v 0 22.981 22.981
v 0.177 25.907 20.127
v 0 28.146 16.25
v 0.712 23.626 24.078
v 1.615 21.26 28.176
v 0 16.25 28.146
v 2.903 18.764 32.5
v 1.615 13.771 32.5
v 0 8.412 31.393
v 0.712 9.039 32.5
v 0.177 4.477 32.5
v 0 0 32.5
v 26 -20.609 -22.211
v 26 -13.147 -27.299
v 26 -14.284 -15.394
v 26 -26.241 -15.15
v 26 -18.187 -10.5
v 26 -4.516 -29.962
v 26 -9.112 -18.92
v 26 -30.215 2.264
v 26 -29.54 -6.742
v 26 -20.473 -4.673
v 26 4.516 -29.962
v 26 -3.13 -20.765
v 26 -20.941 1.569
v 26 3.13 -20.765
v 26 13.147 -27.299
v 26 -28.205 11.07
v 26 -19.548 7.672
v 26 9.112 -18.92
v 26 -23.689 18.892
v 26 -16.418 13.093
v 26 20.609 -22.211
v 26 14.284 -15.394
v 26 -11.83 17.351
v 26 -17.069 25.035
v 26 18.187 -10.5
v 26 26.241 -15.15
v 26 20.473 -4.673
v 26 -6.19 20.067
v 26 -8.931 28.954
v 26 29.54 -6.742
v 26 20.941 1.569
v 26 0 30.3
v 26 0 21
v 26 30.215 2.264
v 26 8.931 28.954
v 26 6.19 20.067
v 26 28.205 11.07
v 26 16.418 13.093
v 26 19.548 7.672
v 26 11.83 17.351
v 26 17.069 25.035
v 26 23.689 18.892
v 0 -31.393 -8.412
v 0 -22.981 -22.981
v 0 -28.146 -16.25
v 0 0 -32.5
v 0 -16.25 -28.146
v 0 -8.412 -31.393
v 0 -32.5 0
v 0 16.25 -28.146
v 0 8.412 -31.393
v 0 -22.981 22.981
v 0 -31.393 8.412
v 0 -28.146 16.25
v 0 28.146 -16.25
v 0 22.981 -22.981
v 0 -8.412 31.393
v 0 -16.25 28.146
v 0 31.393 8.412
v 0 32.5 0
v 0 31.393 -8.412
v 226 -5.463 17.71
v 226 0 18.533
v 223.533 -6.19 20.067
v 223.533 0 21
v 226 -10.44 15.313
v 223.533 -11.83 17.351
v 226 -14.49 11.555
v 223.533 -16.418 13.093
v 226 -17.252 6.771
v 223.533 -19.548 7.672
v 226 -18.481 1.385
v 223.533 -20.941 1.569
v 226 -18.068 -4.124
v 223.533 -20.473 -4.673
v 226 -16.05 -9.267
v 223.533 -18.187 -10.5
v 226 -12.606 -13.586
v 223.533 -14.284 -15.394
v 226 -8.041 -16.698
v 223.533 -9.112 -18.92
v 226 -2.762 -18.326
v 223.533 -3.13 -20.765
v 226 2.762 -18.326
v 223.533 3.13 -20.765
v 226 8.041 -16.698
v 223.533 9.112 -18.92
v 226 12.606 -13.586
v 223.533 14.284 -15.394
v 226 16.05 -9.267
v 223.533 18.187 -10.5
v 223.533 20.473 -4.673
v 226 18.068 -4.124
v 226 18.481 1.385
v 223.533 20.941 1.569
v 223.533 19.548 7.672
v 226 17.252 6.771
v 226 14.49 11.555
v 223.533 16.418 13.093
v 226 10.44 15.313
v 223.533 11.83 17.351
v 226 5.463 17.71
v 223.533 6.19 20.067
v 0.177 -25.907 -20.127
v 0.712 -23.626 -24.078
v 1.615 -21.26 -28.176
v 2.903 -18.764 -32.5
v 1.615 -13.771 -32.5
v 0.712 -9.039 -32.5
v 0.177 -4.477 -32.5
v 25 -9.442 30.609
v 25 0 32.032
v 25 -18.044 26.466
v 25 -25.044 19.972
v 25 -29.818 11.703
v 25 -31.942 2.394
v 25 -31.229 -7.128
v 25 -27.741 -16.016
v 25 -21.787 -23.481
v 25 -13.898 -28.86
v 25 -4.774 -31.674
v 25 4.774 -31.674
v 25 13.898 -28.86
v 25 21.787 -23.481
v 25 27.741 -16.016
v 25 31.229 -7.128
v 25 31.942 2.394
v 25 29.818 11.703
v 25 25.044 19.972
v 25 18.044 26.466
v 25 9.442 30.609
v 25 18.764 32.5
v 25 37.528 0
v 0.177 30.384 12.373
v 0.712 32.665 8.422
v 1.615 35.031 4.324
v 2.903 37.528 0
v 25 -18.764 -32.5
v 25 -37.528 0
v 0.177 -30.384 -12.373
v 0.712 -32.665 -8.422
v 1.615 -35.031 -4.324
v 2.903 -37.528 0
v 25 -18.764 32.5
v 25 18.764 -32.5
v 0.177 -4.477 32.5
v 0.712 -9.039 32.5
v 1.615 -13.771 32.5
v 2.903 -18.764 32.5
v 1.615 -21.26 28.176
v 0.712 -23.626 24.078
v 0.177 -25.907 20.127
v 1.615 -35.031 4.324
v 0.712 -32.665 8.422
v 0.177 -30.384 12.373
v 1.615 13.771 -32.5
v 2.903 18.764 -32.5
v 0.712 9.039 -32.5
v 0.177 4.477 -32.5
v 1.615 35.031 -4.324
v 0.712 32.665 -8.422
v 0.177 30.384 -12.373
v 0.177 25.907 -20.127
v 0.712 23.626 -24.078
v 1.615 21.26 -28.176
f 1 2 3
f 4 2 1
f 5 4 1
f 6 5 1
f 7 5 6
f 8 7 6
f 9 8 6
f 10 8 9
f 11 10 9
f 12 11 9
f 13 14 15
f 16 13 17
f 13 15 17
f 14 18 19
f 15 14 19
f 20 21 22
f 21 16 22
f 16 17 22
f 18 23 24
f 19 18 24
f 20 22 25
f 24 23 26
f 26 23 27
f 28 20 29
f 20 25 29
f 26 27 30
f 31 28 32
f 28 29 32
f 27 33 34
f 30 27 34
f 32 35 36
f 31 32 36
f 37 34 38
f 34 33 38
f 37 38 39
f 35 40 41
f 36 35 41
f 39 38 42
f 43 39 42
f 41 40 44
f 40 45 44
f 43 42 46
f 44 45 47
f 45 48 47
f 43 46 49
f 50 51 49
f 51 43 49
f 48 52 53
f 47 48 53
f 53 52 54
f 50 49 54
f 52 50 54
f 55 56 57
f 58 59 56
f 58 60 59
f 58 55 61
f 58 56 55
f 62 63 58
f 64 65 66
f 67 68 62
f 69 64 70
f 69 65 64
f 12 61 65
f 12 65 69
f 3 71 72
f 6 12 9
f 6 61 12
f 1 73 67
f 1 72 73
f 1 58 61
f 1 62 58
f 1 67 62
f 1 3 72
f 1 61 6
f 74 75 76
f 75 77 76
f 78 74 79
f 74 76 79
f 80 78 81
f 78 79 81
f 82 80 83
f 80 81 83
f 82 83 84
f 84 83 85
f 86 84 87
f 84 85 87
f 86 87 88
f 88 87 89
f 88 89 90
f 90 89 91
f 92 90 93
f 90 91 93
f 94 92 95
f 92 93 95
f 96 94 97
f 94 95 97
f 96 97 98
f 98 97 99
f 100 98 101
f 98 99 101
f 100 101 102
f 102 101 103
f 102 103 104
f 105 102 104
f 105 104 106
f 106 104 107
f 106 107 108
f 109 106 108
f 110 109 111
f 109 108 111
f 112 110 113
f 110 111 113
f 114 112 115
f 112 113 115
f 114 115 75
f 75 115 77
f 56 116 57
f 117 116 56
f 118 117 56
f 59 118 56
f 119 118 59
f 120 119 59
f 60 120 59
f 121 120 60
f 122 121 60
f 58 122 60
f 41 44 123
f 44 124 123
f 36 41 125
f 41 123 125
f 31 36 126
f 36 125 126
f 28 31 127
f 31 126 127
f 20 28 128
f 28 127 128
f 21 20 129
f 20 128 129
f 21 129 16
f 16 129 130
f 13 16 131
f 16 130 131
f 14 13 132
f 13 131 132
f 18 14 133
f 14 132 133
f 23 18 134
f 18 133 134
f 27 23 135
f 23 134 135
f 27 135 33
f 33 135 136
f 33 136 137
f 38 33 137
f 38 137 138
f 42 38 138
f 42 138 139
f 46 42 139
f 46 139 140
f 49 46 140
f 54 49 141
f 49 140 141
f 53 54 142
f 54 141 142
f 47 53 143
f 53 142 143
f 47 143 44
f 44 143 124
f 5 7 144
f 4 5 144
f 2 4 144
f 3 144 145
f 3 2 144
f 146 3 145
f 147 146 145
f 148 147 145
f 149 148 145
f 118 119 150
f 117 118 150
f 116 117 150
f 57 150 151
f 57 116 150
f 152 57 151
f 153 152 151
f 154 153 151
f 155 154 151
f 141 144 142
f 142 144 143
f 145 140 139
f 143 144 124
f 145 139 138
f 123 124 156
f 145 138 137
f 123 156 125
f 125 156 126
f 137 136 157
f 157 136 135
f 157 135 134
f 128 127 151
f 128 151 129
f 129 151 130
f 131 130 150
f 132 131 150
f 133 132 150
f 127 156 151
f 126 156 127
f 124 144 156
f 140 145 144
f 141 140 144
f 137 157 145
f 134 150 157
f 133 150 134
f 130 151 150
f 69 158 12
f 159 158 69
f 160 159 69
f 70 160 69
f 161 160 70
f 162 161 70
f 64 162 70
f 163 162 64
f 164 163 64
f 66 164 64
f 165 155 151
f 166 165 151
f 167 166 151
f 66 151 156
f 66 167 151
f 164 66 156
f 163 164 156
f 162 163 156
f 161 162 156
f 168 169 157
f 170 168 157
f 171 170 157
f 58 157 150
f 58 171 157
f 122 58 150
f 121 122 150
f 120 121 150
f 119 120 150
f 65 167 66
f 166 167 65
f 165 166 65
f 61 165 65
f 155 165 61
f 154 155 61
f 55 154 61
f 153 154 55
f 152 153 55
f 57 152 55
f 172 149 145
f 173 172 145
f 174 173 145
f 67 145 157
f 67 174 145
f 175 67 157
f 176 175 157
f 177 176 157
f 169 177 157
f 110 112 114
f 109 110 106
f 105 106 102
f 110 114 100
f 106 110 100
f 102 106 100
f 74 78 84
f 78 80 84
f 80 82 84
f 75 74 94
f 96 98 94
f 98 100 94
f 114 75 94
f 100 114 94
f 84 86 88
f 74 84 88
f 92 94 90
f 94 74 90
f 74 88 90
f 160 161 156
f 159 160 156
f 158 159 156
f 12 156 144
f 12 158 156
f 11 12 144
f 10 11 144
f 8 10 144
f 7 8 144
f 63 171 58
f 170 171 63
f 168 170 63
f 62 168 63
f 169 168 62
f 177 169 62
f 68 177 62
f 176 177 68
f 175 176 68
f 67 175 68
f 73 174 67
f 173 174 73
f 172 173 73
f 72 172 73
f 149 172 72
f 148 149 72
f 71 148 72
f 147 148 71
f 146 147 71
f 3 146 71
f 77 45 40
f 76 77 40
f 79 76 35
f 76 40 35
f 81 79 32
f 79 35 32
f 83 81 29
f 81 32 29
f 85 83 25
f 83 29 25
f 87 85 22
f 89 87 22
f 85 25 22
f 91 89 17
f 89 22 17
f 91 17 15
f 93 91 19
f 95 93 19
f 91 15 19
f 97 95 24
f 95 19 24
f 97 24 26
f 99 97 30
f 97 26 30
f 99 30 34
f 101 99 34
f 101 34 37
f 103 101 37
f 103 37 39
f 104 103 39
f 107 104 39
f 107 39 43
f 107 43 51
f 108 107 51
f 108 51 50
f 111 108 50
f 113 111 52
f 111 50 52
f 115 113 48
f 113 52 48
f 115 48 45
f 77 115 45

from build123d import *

# Parameters (mm, degrees)
BASEHEAD_DEPTH = 26


with BuildPart() as part:
    # HeadSke → BaseHead (new body)
    with BuildSketch(Plane(origin=(0, 0, 0), x_dir=(0, 0, -1), z_dir=(1, 0, 0))):
        Polygon((32.5, 18.763883749), (32.5, -18.763883749), (0, -37.527767497), (-32.5, -18.763883749), (-32.5, 18.763883749), (0, 37.527767497), align=None)
    extrude(amount=BASEHEAD_DEPTH)

    # BodySke → BaseBody (revolve)
    with BuildSketch(Plane.XY, mode=Mode.PRIVATE) as basebody_sk:
        Polygon((0, 0), (226, 0), (226, 18.533), (223.533, 21), (0, 21), align=None)
    revolve(basebody_sk.sketch.rotate(Axis((0, 0, 0), (1, 0, 0)), 90), axis=Axis((0, 0, 0), (1, 0, 0)))

    # Sketch3 → HeadChamfer (revolve, cut)
    with BuildSketch(Plane(origin=(0, 0, 0), x_dir=(1, 0, 0), z_dir=(0, 1, 0))):
        Polygon((-8.125, 18.427087189), (8.125, 46.572912811), (-13.525635095, 59.072912811), (-29.775635095, 30.927087189), align=None)
    revolve(axis=Axis((0, 0, 0), (1, 0, 0)), mode=Mode.SUBTRACT)

    # BearingSke → BearingFace (revolve, cut)
    with BuildSketch(Plane.XY, mode=Mode.PRIVATE) as bearingface_sk:
        Polygon((26, 30.3), (25, 32.032050808), (25, 37.527767497), (26, 37.527767497), align=None)
    revolve(bearingface_sk.sketch.rotate(Axis((0, 0, 0), (1, 0, 0)), 90), axis=Axis((0, 0, 0), (1, 0, 0)), mode=Mode.SUBTRACT)


solid = part.part
